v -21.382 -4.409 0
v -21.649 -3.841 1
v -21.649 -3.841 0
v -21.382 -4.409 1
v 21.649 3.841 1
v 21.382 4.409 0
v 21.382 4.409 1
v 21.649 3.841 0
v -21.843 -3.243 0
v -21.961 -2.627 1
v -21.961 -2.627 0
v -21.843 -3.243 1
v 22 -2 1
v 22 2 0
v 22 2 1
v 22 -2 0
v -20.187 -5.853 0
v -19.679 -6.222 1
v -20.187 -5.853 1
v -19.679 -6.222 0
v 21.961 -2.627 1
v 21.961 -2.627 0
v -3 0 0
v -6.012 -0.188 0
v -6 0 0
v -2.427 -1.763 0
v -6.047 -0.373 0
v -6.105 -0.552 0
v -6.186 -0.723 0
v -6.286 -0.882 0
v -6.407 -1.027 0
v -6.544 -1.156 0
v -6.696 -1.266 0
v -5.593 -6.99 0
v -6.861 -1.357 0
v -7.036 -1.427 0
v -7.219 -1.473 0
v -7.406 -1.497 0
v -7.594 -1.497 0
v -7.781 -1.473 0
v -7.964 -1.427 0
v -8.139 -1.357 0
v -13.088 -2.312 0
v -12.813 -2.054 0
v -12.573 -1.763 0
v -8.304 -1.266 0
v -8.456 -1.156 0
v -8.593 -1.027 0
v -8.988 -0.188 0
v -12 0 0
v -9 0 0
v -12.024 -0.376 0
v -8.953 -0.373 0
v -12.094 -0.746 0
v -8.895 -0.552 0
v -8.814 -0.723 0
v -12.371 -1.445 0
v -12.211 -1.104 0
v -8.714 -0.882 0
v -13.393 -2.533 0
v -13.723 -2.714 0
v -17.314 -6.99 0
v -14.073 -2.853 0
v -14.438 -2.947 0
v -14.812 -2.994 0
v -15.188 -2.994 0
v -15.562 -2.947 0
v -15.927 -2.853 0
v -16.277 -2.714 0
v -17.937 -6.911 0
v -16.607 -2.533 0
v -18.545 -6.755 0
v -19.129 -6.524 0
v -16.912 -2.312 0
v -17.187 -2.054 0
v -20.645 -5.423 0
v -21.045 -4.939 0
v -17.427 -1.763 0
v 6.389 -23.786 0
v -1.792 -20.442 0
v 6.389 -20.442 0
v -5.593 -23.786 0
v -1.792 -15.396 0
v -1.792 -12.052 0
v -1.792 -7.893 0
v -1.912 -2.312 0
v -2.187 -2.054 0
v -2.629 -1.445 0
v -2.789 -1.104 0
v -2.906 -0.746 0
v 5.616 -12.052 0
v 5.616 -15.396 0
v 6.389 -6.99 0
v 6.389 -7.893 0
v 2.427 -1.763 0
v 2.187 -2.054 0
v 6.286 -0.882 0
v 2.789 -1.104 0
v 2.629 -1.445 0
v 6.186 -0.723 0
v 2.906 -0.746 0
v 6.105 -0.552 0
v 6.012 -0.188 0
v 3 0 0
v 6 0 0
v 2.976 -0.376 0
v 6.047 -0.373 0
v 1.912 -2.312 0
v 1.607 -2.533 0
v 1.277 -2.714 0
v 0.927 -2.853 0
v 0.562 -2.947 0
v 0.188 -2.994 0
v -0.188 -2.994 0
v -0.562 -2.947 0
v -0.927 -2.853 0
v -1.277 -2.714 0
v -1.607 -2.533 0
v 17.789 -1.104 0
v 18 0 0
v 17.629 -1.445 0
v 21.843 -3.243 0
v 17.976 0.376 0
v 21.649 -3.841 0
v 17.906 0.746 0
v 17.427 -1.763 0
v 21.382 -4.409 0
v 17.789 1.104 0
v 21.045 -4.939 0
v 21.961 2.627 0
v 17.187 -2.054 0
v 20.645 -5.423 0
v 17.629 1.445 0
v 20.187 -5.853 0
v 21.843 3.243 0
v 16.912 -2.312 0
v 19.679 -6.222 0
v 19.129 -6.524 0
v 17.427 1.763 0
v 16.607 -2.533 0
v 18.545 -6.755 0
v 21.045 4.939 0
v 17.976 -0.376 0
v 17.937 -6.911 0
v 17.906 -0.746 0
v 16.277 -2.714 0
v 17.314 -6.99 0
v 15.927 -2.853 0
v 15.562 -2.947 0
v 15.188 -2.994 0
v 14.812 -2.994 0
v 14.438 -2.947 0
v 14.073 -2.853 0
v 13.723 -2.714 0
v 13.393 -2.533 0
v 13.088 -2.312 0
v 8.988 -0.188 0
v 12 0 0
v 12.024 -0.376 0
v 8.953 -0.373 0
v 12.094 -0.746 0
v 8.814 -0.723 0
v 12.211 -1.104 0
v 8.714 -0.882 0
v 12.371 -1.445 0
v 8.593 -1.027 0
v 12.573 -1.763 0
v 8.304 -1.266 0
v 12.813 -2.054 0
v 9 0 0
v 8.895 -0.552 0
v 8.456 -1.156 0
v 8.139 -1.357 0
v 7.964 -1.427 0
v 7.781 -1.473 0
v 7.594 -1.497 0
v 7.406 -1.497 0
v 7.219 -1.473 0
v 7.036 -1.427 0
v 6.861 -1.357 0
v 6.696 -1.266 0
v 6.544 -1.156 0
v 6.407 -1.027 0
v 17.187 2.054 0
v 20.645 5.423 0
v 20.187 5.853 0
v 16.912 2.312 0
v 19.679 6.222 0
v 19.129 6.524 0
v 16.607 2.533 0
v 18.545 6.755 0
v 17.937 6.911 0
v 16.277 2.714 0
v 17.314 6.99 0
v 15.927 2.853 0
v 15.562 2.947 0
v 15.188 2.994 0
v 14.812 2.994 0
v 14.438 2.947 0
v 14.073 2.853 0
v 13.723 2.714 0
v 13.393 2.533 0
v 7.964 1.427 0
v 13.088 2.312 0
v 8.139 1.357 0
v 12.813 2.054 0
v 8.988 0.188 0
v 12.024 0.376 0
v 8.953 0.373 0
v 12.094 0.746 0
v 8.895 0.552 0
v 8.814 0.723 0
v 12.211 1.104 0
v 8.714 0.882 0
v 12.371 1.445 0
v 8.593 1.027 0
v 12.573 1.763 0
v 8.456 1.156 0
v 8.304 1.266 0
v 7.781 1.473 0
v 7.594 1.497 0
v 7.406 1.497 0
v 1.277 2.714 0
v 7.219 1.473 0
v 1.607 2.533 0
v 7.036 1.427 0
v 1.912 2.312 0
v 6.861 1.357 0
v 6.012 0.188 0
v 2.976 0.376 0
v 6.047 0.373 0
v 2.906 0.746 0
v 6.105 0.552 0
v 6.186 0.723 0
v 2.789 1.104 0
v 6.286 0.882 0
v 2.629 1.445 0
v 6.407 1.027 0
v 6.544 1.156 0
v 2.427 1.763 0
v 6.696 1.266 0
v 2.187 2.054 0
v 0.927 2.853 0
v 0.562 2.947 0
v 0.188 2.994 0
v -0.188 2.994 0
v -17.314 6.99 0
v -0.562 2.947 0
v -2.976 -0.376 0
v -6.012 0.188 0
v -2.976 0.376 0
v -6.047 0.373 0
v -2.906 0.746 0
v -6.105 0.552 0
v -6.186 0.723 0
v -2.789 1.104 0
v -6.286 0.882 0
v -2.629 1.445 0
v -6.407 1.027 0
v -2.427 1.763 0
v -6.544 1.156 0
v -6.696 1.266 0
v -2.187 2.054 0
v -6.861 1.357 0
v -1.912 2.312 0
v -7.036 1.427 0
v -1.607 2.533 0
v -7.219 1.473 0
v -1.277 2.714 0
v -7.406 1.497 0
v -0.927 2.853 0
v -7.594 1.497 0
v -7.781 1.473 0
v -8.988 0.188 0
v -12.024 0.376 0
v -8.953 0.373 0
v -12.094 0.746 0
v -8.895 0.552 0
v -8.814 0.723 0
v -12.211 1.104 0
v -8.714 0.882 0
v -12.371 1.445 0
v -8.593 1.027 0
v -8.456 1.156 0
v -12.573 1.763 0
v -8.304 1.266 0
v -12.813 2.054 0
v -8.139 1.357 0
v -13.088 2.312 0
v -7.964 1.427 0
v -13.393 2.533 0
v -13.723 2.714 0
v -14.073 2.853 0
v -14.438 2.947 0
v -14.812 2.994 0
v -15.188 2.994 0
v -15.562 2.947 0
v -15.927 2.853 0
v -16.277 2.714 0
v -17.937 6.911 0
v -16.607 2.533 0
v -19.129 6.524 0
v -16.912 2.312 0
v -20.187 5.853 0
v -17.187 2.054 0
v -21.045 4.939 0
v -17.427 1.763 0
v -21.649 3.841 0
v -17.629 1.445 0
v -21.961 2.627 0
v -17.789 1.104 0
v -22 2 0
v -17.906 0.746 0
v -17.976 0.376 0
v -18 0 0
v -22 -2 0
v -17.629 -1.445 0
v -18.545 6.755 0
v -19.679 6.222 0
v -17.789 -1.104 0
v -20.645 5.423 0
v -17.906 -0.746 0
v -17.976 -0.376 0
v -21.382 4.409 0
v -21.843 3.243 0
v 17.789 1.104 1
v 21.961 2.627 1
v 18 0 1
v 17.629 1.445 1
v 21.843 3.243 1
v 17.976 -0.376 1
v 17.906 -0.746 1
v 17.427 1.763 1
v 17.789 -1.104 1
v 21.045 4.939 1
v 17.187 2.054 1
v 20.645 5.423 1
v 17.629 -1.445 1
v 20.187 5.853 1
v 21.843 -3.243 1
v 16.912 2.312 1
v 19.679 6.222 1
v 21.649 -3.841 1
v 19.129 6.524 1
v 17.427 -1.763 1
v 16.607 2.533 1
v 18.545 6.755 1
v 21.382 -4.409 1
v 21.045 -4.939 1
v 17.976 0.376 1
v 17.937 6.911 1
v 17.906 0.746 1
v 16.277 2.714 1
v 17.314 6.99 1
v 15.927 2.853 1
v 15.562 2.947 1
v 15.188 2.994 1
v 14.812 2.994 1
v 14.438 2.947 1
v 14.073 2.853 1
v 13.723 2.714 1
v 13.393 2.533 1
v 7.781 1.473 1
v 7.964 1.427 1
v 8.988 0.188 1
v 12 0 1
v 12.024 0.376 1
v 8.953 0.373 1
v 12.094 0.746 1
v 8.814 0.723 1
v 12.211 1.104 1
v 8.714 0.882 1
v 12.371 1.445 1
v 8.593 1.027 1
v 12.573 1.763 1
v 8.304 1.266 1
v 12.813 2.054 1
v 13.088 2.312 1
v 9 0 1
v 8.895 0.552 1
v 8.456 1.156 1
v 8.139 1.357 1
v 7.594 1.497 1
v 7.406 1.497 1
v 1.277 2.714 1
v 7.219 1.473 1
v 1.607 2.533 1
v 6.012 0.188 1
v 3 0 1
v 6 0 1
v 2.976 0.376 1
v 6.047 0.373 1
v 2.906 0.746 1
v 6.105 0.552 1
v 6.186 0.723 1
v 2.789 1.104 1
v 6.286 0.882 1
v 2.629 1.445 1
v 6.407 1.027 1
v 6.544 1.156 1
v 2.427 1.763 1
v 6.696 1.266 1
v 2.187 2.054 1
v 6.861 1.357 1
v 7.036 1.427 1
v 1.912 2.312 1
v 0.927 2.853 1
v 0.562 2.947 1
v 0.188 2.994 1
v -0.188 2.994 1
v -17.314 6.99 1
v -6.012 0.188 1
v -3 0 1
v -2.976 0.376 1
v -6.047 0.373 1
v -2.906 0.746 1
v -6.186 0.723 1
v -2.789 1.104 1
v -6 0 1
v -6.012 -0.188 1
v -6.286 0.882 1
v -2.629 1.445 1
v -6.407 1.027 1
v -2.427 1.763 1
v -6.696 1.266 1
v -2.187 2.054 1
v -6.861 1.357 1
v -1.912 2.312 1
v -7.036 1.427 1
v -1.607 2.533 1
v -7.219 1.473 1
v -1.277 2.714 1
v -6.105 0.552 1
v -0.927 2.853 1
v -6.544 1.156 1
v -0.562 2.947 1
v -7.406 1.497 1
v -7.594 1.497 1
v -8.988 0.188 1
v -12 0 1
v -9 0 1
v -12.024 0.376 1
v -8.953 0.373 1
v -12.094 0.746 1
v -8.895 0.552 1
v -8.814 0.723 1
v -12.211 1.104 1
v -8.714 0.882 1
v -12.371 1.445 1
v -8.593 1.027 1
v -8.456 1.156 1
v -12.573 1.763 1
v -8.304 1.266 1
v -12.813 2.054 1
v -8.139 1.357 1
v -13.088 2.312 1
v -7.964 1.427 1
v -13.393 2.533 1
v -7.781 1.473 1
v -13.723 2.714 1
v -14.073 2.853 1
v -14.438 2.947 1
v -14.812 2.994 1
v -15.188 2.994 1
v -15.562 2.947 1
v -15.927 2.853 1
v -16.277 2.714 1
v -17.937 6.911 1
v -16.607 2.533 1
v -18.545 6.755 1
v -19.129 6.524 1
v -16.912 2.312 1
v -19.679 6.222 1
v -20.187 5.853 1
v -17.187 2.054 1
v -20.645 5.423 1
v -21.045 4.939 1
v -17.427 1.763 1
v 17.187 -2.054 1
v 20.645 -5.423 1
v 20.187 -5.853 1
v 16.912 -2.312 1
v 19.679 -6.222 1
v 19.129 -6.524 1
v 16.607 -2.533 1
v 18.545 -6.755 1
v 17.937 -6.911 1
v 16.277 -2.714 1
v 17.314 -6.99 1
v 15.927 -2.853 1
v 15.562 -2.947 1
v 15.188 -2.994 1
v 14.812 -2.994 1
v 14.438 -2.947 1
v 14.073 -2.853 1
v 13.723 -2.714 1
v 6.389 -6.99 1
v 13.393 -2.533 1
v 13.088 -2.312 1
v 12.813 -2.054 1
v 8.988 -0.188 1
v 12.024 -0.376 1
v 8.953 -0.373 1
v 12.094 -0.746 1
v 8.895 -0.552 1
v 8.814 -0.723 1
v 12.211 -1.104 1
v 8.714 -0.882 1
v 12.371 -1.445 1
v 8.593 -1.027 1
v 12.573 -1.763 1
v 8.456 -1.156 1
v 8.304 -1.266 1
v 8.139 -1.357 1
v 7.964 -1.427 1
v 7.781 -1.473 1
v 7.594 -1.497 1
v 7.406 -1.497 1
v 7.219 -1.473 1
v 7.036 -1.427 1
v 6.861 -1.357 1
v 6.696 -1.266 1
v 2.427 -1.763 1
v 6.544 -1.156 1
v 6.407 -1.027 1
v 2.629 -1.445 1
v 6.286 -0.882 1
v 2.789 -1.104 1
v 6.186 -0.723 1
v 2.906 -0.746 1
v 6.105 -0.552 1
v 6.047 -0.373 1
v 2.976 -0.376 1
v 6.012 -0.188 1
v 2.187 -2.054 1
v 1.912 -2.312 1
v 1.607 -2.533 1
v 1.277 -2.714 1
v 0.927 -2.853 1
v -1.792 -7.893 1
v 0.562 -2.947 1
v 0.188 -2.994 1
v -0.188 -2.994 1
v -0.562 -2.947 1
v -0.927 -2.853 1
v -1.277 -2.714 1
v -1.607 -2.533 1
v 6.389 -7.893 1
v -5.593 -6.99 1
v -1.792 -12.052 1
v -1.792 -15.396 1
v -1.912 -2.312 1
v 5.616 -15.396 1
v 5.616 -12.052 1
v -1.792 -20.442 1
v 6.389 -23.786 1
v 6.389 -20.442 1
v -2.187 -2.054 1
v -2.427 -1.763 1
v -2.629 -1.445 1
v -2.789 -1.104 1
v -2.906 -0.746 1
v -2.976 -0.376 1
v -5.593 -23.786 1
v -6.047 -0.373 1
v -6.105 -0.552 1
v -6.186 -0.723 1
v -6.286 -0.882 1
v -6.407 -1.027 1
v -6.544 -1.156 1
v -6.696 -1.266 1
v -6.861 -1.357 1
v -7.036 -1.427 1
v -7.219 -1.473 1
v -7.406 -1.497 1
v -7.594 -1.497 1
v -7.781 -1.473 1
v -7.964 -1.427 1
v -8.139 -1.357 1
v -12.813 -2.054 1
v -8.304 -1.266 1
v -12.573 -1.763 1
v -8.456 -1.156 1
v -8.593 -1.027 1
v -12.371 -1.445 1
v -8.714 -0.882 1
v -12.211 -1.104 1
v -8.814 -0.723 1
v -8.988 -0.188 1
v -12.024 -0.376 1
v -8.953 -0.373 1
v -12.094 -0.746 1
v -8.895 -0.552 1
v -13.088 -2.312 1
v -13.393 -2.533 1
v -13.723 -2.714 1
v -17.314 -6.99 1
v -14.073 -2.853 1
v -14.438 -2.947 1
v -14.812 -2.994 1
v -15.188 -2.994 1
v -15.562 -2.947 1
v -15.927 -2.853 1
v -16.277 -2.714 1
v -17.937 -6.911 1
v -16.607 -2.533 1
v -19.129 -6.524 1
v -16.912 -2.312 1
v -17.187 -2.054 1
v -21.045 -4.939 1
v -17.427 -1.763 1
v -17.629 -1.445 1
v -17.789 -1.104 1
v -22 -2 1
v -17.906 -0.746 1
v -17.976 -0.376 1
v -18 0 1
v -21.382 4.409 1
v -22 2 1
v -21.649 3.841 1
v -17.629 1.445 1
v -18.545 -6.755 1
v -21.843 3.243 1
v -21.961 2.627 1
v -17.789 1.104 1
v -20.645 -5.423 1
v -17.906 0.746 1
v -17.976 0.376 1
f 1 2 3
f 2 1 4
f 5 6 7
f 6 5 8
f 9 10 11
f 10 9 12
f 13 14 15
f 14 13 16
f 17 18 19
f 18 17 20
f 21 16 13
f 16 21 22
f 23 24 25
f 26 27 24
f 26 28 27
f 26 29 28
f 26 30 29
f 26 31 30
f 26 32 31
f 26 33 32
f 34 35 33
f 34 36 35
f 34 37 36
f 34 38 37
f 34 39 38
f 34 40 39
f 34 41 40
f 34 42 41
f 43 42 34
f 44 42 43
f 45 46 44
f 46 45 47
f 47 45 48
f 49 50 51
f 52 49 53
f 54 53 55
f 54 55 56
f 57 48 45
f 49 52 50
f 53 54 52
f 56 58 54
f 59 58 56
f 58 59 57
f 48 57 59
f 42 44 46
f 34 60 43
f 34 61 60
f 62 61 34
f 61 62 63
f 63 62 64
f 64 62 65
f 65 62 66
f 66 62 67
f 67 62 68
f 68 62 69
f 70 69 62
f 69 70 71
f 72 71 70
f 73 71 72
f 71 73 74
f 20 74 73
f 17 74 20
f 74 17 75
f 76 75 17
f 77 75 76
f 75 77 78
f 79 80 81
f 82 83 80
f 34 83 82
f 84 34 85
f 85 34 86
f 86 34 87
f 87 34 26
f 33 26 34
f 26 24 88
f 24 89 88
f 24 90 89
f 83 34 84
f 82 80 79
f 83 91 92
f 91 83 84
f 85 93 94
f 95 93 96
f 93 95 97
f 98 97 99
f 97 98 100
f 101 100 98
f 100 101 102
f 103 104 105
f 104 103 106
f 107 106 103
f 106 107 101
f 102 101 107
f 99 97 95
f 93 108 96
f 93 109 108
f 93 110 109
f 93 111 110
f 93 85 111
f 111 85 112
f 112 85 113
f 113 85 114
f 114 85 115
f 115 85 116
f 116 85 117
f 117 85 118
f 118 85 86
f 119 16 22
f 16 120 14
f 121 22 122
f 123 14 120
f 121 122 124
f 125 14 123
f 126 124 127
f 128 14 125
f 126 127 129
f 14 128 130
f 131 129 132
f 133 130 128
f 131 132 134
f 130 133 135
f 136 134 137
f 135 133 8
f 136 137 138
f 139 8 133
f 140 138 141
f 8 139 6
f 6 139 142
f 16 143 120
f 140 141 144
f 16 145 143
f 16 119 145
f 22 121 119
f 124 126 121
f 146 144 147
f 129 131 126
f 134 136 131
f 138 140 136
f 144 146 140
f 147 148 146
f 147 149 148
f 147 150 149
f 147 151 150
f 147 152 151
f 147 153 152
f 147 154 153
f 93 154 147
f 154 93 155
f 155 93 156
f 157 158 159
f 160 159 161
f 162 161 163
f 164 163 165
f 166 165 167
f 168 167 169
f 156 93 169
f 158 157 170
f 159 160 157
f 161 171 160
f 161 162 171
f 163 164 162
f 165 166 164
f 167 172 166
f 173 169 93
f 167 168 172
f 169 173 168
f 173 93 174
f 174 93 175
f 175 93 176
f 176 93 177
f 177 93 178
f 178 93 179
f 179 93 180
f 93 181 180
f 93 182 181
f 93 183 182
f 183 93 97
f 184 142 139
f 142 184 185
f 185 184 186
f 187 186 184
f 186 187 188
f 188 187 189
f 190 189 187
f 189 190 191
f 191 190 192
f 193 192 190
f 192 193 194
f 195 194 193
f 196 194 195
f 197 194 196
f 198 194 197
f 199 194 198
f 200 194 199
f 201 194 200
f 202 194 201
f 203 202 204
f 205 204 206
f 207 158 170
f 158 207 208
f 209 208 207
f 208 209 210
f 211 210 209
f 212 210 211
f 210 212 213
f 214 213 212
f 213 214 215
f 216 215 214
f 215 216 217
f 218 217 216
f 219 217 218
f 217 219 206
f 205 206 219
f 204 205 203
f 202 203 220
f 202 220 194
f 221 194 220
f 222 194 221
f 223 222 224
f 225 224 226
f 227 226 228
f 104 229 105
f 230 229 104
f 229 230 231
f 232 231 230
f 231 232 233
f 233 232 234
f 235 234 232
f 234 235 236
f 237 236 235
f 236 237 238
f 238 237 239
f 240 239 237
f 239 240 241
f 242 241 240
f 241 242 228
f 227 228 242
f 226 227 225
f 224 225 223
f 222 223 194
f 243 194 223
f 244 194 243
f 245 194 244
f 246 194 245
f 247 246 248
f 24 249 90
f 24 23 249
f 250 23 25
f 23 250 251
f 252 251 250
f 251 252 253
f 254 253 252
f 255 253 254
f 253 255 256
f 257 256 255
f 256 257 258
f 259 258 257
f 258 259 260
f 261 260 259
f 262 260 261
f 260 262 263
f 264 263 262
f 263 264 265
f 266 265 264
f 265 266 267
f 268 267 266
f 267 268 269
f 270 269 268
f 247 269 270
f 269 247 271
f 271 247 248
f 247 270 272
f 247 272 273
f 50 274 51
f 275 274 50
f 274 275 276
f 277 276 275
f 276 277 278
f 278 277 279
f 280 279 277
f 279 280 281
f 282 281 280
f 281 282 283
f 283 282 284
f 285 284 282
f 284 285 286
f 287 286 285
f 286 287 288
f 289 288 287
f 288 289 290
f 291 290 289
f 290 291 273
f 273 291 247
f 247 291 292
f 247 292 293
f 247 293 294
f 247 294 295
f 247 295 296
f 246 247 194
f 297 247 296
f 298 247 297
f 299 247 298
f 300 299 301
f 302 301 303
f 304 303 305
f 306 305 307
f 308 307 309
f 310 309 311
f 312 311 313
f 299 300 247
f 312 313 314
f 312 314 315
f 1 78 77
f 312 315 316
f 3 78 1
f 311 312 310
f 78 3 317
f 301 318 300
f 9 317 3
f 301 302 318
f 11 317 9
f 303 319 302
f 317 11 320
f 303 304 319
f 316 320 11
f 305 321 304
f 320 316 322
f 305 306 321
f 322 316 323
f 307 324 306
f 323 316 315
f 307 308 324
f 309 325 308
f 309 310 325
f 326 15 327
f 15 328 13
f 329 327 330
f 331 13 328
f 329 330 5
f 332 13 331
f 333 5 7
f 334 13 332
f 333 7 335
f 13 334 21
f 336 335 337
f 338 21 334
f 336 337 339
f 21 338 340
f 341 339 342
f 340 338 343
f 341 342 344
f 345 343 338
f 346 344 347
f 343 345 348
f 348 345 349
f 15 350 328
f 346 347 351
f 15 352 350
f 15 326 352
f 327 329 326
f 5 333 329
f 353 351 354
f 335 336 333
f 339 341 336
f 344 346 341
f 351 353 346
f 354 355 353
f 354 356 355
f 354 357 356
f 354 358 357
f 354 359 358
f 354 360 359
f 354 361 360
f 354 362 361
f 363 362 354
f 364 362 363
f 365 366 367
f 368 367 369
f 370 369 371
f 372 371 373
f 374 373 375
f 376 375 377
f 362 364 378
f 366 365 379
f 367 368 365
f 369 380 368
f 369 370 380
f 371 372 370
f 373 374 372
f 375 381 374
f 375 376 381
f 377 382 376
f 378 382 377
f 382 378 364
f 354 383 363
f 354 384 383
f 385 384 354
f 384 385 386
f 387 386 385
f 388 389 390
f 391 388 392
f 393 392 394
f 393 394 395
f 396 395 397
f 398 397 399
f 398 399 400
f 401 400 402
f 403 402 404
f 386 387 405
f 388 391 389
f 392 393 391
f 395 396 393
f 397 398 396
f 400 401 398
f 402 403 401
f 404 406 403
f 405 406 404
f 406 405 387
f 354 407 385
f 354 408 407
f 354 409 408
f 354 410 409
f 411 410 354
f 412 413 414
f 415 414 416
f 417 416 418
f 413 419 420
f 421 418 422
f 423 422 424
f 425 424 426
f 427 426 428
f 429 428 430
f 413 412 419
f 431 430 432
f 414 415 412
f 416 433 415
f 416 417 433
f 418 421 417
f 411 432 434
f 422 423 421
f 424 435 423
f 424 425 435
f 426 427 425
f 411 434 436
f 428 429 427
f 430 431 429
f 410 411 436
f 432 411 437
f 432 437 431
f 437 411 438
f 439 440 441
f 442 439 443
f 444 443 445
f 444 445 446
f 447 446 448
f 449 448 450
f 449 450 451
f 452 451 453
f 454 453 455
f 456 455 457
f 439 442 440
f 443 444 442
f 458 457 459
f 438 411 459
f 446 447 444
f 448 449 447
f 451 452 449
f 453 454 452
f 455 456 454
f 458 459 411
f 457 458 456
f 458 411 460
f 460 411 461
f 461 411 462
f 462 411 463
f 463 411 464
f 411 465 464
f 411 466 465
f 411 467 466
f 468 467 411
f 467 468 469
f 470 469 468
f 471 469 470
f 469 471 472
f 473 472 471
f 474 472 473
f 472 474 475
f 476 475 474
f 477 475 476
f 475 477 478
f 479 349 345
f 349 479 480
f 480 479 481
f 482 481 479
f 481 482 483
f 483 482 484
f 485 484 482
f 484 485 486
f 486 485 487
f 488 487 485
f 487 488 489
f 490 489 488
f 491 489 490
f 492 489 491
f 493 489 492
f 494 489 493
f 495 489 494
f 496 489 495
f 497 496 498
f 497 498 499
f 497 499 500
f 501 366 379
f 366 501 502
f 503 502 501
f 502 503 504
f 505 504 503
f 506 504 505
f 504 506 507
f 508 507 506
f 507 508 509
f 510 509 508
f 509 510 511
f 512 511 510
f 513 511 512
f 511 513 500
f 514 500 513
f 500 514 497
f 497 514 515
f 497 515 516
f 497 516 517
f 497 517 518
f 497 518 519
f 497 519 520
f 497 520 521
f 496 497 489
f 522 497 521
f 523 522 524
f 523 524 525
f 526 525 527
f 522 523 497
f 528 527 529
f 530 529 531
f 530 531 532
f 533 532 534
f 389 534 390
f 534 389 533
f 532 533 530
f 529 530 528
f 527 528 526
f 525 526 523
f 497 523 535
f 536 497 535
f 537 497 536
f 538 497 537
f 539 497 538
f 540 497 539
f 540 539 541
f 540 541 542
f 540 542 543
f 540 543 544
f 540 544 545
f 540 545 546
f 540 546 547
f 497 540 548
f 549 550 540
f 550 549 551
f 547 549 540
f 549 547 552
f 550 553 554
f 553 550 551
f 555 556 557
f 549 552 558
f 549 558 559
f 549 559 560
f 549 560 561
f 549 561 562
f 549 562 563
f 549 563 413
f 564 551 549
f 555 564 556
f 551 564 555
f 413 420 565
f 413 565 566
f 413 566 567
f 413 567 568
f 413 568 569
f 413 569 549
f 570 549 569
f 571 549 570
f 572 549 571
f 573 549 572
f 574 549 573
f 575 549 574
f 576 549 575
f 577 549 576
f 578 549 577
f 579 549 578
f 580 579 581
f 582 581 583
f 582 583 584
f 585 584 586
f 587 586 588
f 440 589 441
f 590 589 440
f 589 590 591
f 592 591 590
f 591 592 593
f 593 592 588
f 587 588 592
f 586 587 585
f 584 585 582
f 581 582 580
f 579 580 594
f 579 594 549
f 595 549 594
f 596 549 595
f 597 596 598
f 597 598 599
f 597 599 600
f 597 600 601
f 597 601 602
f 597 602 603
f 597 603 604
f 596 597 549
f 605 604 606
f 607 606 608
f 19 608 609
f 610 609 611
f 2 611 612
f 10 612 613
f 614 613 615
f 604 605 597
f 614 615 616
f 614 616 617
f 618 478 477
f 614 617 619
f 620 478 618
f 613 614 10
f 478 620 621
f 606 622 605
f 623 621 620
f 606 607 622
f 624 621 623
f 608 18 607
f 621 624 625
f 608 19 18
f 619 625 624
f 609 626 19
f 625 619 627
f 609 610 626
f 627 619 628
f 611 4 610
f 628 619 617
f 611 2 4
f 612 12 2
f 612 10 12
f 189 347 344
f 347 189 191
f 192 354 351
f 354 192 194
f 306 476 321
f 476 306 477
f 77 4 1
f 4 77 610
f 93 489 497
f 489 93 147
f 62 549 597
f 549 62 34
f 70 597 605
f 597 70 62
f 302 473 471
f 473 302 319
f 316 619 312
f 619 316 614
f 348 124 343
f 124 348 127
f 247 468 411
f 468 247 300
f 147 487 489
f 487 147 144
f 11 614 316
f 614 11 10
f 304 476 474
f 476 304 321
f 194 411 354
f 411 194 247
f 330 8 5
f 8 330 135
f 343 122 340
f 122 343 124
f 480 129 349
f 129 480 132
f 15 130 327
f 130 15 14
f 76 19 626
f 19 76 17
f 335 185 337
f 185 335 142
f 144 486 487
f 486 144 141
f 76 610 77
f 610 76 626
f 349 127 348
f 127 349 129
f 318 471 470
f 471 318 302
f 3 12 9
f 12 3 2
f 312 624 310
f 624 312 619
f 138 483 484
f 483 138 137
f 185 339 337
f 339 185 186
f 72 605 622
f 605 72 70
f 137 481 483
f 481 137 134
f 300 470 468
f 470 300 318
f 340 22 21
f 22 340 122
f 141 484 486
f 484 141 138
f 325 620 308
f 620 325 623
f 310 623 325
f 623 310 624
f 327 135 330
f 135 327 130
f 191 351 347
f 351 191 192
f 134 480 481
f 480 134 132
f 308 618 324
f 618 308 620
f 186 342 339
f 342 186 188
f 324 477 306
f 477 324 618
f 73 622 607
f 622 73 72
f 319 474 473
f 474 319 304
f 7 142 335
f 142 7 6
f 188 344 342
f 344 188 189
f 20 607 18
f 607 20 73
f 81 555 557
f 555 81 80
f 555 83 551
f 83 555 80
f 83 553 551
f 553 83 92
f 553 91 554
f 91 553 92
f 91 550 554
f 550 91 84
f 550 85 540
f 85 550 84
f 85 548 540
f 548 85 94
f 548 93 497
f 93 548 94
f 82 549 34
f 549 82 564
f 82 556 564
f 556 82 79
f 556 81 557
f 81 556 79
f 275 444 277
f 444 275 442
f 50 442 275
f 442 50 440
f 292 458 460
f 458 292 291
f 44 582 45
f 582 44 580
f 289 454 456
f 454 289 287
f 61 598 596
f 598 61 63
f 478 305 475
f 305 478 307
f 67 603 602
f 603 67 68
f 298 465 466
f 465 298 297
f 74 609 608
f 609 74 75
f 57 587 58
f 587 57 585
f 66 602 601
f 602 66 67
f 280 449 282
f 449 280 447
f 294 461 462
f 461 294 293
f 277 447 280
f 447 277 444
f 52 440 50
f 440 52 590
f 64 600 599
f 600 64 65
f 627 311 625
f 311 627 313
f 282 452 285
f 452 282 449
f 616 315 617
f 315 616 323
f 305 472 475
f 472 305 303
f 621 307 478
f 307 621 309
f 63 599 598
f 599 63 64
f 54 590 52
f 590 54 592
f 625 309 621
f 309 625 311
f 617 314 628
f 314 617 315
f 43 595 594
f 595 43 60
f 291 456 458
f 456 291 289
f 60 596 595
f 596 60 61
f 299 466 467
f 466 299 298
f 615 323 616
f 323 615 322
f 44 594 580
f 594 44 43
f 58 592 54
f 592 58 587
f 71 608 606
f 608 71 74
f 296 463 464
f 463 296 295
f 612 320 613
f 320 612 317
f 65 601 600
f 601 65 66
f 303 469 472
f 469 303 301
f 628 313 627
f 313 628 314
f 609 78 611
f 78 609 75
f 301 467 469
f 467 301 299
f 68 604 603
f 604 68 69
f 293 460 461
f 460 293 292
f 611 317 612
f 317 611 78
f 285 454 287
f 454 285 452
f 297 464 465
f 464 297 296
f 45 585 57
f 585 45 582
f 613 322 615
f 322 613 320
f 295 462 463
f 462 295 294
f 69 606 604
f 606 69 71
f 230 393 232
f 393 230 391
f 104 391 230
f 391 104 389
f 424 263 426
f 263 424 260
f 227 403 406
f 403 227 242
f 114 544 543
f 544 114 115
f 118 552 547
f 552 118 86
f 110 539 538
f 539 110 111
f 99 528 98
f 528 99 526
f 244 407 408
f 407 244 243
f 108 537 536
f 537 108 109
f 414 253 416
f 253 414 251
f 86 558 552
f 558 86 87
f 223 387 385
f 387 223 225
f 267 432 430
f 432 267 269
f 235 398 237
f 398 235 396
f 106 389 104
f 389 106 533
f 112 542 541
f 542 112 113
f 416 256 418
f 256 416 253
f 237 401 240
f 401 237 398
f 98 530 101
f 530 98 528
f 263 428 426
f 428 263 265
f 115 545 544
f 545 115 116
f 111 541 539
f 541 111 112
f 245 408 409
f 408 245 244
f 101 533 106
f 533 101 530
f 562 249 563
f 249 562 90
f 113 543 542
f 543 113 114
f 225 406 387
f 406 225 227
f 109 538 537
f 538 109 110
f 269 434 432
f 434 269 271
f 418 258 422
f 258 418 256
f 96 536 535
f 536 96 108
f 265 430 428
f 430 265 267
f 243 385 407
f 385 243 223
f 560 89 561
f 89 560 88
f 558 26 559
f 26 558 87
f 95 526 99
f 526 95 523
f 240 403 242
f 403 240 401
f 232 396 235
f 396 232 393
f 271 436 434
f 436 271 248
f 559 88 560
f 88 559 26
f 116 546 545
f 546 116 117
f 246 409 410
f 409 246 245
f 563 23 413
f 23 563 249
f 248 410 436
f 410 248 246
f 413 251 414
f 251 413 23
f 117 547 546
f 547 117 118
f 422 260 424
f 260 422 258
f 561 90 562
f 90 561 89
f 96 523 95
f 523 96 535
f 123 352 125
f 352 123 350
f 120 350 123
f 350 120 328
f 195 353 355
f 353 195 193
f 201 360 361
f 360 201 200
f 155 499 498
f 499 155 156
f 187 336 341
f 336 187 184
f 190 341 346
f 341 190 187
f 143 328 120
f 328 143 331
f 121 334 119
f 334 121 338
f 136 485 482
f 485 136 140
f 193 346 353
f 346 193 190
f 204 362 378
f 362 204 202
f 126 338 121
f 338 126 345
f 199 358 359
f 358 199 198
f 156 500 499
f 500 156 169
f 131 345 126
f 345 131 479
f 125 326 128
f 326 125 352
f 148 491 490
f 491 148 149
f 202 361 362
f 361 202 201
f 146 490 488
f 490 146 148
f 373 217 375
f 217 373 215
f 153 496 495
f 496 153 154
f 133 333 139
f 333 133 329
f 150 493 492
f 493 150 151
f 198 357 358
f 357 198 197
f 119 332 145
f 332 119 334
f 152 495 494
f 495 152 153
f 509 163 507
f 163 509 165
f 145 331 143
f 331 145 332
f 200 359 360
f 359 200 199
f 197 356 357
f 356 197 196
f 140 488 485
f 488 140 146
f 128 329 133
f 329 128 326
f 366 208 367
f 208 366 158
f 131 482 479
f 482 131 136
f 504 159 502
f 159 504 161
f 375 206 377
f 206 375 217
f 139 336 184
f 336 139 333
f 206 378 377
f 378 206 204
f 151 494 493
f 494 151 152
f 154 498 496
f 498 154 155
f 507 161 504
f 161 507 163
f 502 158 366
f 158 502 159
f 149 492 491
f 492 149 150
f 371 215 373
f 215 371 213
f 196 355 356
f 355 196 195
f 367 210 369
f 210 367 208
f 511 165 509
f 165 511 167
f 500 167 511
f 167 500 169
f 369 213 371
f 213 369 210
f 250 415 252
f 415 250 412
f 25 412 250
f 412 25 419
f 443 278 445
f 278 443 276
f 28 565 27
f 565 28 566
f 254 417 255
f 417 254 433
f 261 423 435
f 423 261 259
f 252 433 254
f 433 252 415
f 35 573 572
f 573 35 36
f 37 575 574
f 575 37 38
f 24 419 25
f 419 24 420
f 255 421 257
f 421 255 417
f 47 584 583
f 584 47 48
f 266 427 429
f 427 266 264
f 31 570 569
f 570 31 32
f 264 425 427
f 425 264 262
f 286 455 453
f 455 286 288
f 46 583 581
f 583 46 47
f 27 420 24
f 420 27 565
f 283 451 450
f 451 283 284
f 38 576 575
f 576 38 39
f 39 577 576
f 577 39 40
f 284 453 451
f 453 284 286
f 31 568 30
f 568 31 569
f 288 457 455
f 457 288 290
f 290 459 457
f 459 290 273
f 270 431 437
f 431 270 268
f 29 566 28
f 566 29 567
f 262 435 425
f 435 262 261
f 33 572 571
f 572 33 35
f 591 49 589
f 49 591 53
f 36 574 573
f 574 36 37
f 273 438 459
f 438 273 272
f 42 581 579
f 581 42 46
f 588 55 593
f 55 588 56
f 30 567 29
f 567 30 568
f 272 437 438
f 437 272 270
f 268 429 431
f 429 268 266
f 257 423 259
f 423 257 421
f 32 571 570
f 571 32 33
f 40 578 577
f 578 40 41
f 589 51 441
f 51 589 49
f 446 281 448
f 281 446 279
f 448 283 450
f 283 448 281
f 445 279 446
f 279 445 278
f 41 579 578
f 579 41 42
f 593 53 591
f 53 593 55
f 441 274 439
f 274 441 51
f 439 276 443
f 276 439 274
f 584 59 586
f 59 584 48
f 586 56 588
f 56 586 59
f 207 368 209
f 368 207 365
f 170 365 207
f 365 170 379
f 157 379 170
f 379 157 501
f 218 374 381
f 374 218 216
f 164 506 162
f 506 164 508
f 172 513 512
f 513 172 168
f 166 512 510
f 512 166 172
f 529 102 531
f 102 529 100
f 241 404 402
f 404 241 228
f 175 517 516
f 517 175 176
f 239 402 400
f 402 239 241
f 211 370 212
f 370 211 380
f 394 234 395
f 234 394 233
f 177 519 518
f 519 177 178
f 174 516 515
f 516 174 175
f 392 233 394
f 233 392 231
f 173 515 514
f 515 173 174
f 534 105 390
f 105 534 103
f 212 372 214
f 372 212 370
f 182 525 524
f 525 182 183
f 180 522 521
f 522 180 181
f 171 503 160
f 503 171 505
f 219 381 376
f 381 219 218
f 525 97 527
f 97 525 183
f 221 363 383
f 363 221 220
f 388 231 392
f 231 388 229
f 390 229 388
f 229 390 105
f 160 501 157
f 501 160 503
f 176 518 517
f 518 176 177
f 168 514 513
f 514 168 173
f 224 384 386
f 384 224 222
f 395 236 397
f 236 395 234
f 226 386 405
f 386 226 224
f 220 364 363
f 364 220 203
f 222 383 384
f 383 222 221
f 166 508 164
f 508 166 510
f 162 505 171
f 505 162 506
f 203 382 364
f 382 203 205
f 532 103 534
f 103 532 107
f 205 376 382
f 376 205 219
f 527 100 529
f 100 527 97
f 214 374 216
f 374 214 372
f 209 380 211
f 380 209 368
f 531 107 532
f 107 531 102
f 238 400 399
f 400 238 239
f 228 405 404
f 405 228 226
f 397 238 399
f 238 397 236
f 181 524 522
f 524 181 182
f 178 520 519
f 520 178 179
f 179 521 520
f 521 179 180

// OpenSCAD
$fn = 50;


difference() {
	union() {
		hull() {
			translate(v = [-17.0000000000, 2.0000000000, 0]) {
				cylinder(h = 1, r = 5);
			}
			translate(v = [17.0000000000, 2.0000000000, 0]) {
				cylinder(h = 1, r = 5);
			}
			translate(v = [-17.0000000000, -2.0000000000, 0]) {
				cylinder(h = 1, r = 5);
			}
			translate(v = [17.0000000000, -2.0000000000, 0]) {
				cylinder(h = 1, r = 5);
			}
		}
		translate(v = [0, -5, 0]) {
			linear_extrude(height = 1) {
				text(font = "DejaVu Sans Mono:style=Bold", halign = "center", size = 19.0000000000, text = "E", valign = "top");
			}
		}
	}
	union() {
		translate(v = [-15.0000000000, 0.0000000000, 0]) {
			translate(v = [0, 0, -100]) {
				cylinder(h = 200, r = 3.0000000000);
			}
		}
		translate(v = [0, 0, -100]) {
			cylinder(h = 200, r = 3.0000000000);
		}
		translate(v = [15.0000000000, 0.0000000000, 0]) {
			translate(v = [0, 0, -100]) {
				cylinder(h = 200, r = 3.0000000000);
			}
		}
		translate(v = [-15.0000000000, 0.0000000000, 0]) {
			translate(v = [0, 0, -100]) {
				cylinder(h = 200, r = 1.5000000000);
			}
		}
		translate(v = [-7.5000000000, 0.0000000000, 0]) {
			translate(v = [0, 0, -100]) {
				cylinder(h = 200, r = 1.5000000000);
			}
		}
		translate(v = [0, 0, -100]) {
			cylinder(h = 200, r = 1.5000000000);
		}
		translate(v = [7.5000000000, 0.0000000000, 0]) {
			translate(v = [0, 0, -100]) {
				cylinder(h = 200, r = 1.5000000000);
			}
		}
		translate(v = [15.0000000000, 0.0000000000, 0]) {
			translate(v = [0, 0, -100]) {
				cylinder(h = 200, r = 1.5000000000);
			}
		}
	}
}
